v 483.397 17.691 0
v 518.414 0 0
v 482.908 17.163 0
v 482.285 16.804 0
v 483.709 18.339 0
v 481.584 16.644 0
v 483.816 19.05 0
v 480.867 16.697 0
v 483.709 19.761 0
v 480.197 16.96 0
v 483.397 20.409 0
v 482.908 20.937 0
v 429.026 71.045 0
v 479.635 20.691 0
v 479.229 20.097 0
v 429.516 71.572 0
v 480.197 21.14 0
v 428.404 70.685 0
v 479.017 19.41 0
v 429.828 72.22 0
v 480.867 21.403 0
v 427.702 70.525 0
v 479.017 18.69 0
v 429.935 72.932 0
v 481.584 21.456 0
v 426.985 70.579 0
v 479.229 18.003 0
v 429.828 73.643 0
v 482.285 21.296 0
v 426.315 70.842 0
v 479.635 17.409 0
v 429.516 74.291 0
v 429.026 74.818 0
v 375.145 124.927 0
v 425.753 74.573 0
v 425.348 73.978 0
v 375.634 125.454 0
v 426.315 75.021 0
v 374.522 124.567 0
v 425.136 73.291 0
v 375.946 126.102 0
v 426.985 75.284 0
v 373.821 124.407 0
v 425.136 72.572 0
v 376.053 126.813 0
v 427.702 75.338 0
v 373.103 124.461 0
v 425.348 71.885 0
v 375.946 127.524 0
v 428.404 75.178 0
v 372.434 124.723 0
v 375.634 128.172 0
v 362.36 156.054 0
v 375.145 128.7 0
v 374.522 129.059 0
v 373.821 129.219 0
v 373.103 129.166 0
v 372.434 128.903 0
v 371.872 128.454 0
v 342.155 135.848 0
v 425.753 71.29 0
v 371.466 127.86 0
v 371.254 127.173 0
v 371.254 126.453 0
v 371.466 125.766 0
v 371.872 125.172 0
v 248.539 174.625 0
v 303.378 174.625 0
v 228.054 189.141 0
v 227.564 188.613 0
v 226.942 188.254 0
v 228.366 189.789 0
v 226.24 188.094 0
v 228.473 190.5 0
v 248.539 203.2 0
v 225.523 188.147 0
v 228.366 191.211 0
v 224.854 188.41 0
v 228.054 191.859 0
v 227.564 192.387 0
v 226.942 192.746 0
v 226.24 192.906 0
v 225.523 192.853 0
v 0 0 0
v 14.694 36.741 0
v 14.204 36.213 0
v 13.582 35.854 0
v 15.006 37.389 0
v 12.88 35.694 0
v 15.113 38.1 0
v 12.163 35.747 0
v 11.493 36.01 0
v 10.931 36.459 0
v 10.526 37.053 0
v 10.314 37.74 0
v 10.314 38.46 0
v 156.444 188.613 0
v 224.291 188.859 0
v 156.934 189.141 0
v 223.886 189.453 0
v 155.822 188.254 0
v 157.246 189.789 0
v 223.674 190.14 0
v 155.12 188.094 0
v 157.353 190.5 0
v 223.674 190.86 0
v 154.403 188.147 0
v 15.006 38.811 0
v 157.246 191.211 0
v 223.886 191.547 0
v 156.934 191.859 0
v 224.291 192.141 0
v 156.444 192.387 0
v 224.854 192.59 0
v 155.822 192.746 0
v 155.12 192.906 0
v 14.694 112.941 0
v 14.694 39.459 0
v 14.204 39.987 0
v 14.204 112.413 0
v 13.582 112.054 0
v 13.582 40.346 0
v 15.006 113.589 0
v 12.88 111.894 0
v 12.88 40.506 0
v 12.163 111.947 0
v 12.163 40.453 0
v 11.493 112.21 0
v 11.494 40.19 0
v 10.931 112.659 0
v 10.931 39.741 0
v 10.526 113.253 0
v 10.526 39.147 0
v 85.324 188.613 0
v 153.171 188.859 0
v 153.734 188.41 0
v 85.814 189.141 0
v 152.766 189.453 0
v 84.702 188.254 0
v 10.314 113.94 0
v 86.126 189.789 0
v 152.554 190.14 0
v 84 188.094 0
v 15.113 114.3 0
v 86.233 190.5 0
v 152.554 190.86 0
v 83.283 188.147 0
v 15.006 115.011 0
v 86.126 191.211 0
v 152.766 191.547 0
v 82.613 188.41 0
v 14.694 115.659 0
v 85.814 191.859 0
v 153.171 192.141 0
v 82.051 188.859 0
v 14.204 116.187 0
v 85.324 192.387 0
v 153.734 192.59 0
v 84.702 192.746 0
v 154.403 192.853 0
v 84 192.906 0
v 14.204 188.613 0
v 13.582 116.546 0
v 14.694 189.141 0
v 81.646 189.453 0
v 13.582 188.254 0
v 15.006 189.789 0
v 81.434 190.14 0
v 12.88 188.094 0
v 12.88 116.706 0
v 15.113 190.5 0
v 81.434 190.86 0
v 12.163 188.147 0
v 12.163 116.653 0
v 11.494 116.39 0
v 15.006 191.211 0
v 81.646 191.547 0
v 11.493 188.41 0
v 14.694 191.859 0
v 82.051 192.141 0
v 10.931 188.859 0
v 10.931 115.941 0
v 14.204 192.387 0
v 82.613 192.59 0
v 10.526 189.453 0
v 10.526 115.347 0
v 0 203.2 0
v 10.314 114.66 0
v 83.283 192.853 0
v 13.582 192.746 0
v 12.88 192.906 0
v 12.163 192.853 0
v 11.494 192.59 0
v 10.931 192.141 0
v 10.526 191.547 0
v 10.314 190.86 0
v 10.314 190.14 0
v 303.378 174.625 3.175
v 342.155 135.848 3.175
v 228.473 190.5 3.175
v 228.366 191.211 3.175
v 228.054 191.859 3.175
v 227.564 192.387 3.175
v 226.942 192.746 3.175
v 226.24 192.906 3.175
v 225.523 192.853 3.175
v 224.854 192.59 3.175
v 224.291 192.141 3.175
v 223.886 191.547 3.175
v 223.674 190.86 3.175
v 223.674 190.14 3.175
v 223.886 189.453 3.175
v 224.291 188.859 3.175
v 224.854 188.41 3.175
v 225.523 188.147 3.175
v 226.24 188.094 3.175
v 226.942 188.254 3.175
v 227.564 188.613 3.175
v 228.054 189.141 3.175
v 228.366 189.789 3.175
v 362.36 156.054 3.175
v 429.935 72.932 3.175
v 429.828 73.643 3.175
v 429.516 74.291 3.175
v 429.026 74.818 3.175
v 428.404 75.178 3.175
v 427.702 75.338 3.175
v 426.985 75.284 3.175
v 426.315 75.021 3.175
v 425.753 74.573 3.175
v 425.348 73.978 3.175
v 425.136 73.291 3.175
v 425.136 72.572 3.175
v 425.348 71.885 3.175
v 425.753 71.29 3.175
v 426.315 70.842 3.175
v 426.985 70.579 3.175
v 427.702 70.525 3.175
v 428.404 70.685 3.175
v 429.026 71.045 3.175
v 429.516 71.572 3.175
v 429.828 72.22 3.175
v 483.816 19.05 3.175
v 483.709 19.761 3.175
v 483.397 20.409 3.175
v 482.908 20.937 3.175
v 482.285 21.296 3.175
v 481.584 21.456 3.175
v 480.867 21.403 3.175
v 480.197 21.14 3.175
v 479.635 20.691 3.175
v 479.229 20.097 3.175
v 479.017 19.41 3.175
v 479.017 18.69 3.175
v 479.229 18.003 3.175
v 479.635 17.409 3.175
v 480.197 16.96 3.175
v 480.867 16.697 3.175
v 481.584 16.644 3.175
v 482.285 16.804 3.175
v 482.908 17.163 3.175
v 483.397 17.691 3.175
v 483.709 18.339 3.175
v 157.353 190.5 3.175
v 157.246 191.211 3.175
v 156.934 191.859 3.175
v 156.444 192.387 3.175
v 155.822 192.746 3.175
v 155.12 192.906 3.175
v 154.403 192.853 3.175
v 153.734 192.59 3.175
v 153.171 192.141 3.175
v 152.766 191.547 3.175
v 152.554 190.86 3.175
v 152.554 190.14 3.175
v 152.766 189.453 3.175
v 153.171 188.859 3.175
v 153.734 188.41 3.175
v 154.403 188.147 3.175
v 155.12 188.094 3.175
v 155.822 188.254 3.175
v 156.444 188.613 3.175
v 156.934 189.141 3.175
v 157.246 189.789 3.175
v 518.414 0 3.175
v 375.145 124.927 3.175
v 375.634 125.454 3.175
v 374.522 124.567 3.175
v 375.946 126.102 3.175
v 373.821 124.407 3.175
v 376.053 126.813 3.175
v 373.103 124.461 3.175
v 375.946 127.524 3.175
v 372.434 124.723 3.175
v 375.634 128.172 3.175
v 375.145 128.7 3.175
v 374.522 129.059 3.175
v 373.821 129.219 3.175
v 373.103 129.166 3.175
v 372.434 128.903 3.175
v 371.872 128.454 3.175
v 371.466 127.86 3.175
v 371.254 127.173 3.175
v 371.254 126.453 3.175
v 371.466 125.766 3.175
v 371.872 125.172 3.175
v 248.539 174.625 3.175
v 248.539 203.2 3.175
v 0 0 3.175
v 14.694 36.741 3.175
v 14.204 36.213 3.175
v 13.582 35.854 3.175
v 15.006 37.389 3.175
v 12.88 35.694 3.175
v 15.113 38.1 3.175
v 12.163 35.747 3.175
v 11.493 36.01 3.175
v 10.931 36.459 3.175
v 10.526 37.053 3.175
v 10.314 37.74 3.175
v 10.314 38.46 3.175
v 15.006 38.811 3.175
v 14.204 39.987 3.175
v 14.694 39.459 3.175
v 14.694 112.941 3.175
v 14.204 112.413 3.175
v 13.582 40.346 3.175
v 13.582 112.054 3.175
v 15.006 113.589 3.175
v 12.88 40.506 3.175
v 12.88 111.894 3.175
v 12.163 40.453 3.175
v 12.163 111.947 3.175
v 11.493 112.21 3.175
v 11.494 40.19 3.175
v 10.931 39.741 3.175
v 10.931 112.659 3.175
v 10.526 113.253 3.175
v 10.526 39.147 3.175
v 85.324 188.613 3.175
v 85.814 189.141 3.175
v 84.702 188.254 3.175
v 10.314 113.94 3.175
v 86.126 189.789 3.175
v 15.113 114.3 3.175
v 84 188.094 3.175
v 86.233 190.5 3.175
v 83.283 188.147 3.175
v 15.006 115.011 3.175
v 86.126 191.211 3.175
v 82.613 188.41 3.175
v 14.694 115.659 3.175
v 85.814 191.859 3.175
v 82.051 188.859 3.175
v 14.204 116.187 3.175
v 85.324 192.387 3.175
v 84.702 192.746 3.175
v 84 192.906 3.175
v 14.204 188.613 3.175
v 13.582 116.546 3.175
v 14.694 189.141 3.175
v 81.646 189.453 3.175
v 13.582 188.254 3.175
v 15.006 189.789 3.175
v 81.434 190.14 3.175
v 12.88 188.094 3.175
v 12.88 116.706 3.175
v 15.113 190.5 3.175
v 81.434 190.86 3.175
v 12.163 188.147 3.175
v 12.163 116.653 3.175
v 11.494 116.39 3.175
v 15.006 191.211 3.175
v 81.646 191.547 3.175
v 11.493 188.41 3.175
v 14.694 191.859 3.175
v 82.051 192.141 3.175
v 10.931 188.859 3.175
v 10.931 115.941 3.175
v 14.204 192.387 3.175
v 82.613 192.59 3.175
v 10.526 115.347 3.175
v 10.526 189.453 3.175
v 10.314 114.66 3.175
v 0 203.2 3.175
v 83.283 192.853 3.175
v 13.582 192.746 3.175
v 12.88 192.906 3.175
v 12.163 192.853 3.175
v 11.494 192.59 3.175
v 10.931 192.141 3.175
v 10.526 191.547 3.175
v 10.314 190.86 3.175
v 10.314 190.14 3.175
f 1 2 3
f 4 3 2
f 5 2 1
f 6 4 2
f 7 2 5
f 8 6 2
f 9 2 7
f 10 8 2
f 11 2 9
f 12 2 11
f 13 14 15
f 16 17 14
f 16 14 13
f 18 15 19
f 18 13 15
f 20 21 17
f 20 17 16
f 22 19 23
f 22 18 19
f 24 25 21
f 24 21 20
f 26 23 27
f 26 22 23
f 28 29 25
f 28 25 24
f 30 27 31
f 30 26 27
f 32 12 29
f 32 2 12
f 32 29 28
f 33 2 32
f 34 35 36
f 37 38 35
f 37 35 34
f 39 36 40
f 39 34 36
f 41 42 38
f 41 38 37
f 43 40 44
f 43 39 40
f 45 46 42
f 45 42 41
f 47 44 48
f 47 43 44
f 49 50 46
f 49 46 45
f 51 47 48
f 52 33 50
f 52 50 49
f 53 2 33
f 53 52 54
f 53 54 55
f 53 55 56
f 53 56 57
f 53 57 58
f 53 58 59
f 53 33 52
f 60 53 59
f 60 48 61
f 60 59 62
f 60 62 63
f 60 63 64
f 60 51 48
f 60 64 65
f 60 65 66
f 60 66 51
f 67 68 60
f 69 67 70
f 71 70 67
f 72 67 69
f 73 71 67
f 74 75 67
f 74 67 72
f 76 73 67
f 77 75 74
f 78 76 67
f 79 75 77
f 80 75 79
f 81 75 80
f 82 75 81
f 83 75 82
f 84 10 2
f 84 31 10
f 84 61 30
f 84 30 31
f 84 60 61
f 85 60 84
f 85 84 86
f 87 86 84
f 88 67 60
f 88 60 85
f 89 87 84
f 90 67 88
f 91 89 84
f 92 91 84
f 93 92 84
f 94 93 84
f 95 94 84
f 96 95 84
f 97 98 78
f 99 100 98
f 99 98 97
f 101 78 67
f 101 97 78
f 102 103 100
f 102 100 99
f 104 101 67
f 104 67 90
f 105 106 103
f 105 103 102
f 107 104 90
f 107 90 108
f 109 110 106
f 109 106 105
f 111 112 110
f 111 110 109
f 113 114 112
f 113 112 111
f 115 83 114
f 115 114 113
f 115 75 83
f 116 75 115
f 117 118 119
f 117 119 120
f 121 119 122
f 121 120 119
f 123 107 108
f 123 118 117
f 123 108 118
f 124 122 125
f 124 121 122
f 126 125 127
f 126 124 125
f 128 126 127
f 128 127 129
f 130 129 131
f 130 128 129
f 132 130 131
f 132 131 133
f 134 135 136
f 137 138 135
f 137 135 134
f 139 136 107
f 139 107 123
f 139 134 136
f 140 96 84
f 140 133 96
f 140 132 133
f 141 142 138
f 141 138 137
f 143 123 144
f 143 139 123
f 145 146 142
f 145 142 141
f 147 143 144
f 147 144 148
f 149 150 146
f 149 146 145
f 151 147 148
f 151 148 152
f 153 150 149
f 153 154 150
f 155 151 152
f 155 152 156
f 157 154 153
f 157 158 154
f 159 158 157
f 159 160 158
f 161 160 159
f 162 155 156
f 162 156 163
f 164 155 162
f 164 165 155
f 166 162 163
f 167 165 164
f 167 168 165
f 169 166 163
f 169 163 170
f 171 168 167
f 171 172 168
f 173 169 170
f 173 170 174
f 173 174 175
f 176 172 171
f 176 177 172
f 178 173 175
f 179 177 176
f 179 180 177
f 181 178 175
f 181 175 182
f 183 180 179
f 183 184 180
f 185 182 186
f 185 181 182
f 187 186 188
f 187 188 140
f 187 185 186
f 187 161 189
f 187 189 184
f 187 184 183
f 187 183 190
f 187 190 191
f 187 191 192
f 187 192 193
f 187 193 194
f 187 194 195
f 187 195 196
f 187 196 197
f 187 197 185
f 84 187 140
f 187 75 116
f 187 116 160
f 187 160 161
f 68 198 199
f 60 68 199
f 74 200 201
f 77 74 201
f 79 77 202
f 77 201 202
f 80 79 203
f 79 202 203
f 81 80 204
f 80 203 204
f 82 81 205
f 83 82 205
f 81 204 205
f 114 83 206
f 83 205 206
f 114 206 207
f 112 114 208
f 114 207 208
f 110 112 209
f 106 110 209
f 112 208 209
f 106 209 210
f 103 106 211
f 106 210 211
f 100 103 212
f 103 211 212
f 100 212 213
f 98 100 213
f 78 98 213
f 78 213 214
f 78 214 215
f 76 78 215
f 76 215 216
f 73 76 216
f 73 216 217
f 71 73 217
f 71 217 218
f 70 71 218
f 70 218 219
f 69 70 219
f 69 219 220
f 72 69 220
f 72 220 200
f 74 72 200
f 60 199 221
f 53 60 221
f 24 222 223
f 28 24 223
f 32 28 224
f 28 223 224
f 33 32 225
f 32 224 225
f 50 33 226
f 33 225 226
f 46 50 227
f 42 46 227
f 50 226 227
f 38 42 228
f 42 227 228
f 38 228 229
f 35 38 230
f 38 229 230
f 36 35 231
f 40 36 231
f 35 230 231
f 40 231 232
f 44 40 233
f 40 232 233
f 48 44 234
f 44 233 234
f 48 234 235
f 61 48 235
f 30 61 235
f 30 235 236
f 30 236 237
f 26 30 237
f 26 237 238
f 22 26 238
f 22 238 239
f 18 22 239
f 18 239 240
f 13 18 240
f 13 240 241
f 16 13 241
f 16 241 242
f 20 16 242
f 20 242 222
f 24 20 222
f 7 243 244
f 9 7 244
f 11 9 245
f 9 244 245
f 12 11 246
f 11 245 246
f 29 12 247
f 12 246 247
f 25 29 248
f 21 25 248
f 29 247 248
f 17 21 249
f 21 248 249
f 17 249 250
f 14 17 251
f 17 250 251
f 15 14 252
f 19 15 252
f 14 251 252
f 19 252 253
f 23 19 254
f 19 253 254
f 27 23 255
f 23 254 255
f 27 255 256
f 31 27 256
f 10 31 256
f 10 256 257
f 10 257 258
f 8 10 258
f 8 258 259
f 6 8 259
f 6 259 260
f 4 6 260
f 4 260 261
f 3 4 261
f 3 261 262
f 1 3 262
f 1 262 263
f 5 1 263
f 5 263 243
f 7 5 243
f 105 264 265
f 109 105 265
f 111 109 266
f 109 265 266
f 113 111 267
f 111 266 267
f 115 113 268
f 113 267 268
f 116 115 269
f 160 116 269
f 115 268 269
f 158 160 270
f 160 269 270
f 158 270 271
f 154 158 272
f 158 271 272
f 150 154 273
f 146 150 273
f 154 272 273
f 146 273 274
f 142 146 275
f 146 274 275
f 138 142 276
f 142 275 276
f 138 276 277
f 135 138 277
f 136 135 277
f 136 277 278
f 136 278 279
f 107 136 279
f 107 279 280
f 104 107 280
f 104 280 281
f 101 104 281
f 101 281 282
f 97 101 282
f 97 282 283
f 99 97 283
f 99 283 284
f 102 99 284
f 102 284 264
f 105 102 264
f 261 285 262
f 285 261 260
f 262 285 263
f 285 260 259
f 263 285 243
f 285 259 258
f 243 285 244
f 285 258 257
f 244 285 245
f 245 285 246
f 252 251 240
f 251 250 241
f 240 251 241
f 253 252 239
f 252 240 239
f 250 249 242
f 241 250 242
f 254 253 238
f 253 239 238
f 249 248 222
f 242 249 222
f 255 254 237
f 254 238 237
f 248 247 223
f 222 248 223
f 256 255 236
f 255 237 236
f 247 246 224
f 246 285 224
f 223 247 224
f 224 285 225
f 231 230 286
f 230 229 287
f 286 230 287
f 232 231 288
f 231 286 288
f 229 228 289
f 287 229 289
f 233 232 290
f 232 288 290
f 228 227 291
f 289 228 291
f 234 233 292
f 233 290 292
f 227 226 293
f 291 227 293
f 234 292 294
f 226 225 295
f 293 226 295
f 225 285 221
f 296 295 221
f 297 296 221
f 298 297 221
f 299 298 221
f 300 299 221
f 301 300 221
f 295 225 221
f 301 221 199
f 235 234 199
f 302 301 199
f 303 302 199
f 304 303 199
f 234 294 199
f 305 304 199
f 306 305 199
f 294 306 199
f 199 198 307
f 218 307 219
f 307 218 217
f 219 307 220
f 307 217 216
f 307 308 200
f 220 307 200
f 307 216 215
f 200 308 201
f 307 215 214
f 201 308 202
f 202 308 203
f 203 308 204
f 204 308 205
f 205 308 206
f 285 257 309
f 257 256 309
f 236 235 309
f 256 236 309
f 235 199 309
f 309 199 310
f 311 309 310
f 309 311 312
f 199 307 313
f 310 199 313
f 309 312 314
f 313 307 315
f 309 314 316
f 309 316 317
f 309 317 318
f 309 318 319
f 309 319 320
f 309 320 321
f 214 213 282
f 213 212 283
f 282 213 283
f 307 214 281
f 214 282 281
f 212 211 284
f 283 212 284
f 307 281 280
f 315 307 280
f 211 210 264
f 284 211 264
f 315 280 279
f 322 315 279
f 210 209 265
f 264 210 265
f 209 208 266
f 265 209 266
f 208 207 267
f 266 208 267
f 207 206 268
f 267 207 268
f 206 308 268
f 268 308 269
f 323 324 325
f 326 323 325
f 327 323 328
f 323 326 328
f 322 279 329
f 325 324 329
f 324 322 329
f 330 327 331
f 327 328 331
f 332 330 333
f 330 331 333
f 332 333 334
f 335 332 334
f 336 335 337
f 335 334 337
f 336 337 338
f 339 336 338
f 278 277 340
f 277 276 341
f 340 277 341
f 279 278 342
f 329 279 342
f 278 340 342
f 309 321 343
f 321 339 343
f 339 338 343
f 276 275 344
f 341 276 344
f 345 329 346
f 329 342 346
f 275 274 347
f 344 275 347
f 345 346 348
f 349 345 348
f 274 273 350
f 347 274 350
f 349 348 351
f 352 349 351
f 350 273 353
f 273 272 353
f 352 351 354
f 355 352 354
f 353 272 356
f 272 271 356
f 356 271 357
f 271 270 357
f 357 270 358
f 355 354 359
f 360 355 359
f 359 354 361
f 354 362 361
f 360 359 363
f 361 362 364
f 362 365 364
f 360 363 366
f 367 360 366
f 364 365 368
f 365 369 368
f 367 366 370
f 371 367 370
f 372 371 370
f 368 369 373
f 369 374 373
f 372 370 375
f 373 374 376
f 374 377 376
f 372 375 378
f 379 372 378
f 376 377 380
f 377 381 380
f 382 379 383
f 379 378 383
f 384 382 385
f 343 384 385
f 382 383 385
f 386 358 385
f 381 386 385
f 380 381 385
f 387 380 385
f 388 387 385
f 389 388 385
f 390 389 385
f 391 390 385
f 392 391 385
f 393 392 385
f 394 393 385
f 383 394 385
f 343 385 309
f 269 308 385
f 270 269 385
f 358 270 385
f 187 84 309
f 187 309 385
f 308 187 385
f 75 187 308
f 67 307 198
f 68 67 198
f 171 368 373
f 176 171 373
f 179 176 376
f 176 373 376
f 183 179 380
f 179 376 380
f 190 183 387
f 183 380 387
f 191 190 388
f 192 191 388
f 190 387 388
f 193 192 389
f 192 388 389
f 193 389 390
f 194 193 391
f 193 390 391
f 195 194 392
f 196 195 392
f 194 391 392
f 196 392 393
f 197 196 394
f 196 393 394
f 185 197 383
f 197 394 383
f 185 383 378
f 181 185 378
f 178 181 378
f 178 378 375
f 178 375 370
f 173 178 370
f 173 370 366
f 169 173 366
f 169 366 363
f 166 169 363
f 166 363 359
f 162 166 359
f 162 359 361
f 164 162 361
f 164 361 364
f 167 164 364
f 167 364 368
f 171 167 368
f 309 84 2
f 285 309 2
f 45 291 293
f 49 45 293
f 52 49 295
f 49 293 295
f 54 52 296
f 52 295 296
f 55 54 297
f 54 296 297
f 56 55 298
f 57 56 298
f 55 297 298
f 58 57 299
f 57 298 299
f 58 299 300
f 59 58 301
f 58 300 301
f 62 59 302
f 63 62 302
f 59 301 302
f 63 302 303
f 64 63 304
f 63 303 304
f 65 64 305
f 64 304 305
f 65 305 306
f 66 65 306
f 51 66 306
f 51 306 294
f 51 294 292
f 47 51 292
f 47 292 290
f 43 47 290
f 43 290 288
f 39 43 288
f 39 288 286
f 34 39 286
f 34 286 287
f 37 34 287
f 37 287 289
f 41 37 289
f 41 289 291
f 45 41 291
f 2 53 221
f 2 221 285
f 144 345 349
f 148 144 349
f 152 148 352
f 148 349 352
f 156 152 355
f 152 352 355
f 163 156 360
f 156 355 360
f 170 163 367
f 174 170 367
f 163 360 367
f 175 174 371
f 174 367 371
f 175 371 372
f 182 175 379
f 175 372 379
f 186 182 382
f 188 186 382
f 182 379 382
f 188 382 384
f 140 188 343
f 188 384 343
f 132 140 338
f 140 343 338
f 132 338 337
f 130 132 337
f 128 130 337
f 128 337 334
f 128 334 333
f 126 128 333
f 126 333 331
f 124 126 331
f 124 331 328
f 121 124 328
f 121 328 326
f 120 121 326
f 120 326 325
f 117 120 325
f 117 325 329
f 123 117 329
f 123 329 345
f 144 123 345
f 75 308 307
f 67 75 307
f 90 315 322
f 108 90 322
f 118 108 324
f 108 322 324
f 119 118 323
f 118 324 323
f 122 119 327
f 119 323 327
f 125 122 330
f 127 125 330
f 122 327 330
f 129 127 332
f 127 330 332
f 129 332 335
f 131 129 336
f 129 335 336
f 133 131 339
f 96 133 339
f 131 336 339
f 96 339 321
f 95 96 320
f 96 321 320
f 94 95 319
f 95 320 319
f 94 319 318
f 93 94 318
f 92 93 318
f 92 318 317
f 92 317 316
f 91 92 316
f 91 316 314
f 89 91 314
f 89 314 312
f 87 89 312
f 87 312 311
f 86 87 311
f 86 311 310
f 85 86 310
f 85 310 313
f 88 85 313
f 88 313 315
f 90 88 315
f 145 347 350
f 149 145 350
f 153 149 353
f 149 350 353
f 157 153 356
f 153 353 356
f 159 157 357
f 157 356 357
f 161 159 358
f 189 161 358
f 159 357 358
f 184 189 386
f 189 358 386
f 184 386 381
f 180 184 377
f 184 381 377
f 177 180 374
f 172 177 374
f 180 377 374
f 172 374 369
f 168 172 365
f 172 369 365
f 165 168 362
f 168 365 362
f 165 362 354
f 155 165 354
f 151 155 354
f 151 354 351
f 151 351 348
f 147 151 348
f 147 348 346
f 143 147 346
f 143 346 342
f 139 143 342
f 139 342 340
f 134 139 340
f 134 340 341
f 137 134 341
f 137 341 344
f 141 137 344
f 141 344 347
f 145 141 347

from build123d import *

# Parameters (mm, degrees)
BOSS_EXTRUDE1_DEPTH = 3.175
CUT_EXTRUDE1_REACH  = 5.175
SKETCH2_R           = 2.413
CUT_EXTRUDE2_REACH  = 5.175
SKETCH3_R           = 2.413
CUT_EXTRUDE3_REACH  = 5.175


with BuildPart() as part:
    # Sketch1 → Boss-Extrude1 (new body)
    with BuildSketch(Plane.XY):
        Polygon((315.214, 203.2), (518.414, 0), (127, 0), (0, 0), (0, 203.2), align=None)
    extrude(amount=BOSS_EXTRUDE1_DEPTH)

    # Sketch2 → Cut-Extrude1 (cut, up to next)
    with BuildSketch(Plane.XY.offset(3.175), mode=Mode.PRIVATE) as cut_extrude1_sk1:
        with Locations((12.7, 190.5)):
            Circle(SKETCH2_R)
    cut_extrude1_tool1 = extrude(cut_extrude1_sk1.sketch, amount=-CUT_EXTRUDE1_REACH, mode=Mode.PRIVATE) & part.part
    add(cut_extrude1_tool1.solids().sort_by_distance((12.7, 190.5, 3.175))[0], mode=Mode.SUBTRACT)
    # Sketch2 → Cut-Extrude1 (cut, up to next)
    with BuildSketch(Plane.XY.offset(3.175), mode=Mode.PRIVATE) as cut_extrude1_sk2:
        with Locations((83.82, 190.5)):
            Circle(SKETCH2_R)
    cut_extrude1_tool2 = extrude(cut_extrude1_sk2.sketch, amount=-CUT_EXTRUDE1_REACH, mode=Mode.PRIVATE) & part.part
    add(cut_extrude1_tool2.solids().sort_by_distance((83.82, 190.5, 3.175))[0], mode=Mode.SUBTRACT)
    # Sketch2 → Cut-Extrude1 (cut, up to next)
    with BuildSketch(Plane.XY.offset(3.175), mode=Mode.PRIVATE) as cut_extrude1_sk3:
        with Locations((154.94, 190.5)):
            Circle(SKETCH2_R)
    cut_extrude1_tool3 = extrude(cut_extrude1_sk3.sketch, amount=-CUT_EXTRUDE1_REACH, mode=Mode.PRIVATE) & part.part
    add(cut_extrude1_tool3.solids().sort_by_distance((154.94, 190.5, 3.175))[0], mode=Mode.SUBTRACT)
    # Sketch2 → Cut-Extrude1 (cut, up to next)
    with BuildSketch(Plane.XY.offset(3.175), mode=Mode.PRIVATE) as cut_extrude1_sk4:
        with Locations((226.06, 190.5)):
            Circle(SKETCH2_R)
    cut_extrude1_tool4 = extrude(cut_extrude1_sk4.sketch, amount=-CUT_EXTRUDE1_REACH, mode=Mode.PRIVATE) & part.part
    add(cut_extrude1_tool4.solids().sort_by_distance((226.06, 190.5, 3.175))[0], mode=Mode.SUBTRACT)
    # Sketch2 → Cut-Extrude1 (cut, up to next)
    with BuildSketch(Plane.XY.offset(3.175), mode=Mode.PRIVATE) as cut_extrude1_sk5:
        with Locations((12.7, 114.3)):
            Circle(SKETCH2_R)
    cut_extrude1_tool5 = extrude(cut_extrude1_sk5.sketch, amount=-CUT_EXTRUDE1_REACH, mode=Mode.PRIVATE) & part.part
    add(cut_extrude1_tool5.solids().sort_by_distance((12.7, 114.3, 3.175))[0], mode=Mode.SUBTRACT)
    # Sketch2 → Cut-Extrude1 (cut, up to next)
    with BuildSketch(Plane.XY.offset(3.175), mode=Mode.PRIVATE) as cut_extrude1_sk6:
        with Locations((12.7, 38.1)):
            Circle(SKETCH2_R)
    cut_extrude1_tool6 = extrude(cut_extrude1_sk6.sketch, amount=-CUT_EXTRUDE1_REACH, mode=Mode.PRIVATE) & part.part
    add(cut_extrude1_tool6.solids().sort_by_distance((12.7, 38.1, 3.175))[0], mode=Mode.SUBTRACT)

    # Sketch3 → Cut-Extrude2 (cut, up to next)
    with BuildSketch(Plane.XY.offset(3.175), mode=Mode.PRIVATE) as cut_extrude2_sk1:
        with Locations((481.403487758, 19.05)):
            Circle(SKETCH3_R)
    cut_extrude2_tool1 = extrude(cut_extrude2_sk1.sketch, amount=-CUT_EXTRUDE2_REACH, mode=Mode.PRIVATE) & part.part
    add(cut_extrude2_tool1.solids().sort_by_distance((481.403488, 19.05, 3.175))[0], mode=Mode.SUBTRACT)
    # Sketch3 → Cut-Extrude2 (cut, up to next)
    with BuildSketch(Plane.XY.offset(3.175), mode=Mode.PRIVATE) as cut_extrude2_sk2:
        with Locations((427.521951031, 72.931536726)):
            Circle(SKETCH3_R)
    cut_extrude2_tool2 = extrude(cut_extrude2_sk2.sketch, amount=-CUT_EXTRUDE2_REACH, mode=Mode.PRIVATE) & part.part
    add(cut_extrude2_tool2.solids().sort_by_distance((427.521951, 72.931537, 3.175))[0], mode=Mode.SUBTRACT)
    # Sketch3 → Cut-Extrude2 (cut, up to next)
    with BuildSketch(Plane.XY.offset(3.175), mode=Mode.PRIVATE) as cut_extrude2_sk3:
        with Locations((373.640414305, 126.813073453)):
            Circle(SKETCH3_R)
    cut_extrude2_tool3 = extrude(cut_extrude2_sk3.sketch, amount=-CUT_EXTRUDE2_REACH, mode=Mode.PRIVATE) & part.part
    add(cut_extrude2_tool3.solids().sort_by_distance((373.640414, 126.813073, 3.175))[0], mode=Mode.SUBTRACT)
    # Sketch3 → Cut-Extrude2 (cut, up to next)
    with BuildSketch(Plane.XY.offset(3.175), mode=Mode.PRIVATE) as cut_extrude2_sk4:
        with Locations((319.758877579, 180.694610179)):
            Circle(SKETCH3_R)
    cut_extrude2_tool4 = extrude(cut_extrude2_sk4.sketch, amount=-CUT_EXTRUDE2_REACH, mode=Mode.PRIVATE) & part.part
    add(cut_extrude2_tool4.solids().sort_by_distance((319.758878, 180.69461, 3.175))[0], mode=Mode.SUBTRACT)

    # Sketch4 → Cut-Extrude3 (cut, up to next)
    with BuildSketch(Plane.XY.offset(3.175), mode=Mode.PRIVATE) as cut_extrude3_sk1:
        Polygon((315.214, 203.2), (248.539, 203.2), (248.539, 174.625), (303.377847455, 174.625), (342.154768363, 135.848079092), (362.360344636, 156.053655364), align=None)
    cut_extrude3_tool1 = extrude(cut_extrude3_sk1.sketch, amount=-CUT_EXTRUDE3_REACH, mode=Mode.PRIVATE) & part.part
    add(cut_extrude3_tool1.solids().sort_by_distance((305.025183, 178.602019, 3.175))[0], mode=Mode.SUBTRACT)


solid = part.part
